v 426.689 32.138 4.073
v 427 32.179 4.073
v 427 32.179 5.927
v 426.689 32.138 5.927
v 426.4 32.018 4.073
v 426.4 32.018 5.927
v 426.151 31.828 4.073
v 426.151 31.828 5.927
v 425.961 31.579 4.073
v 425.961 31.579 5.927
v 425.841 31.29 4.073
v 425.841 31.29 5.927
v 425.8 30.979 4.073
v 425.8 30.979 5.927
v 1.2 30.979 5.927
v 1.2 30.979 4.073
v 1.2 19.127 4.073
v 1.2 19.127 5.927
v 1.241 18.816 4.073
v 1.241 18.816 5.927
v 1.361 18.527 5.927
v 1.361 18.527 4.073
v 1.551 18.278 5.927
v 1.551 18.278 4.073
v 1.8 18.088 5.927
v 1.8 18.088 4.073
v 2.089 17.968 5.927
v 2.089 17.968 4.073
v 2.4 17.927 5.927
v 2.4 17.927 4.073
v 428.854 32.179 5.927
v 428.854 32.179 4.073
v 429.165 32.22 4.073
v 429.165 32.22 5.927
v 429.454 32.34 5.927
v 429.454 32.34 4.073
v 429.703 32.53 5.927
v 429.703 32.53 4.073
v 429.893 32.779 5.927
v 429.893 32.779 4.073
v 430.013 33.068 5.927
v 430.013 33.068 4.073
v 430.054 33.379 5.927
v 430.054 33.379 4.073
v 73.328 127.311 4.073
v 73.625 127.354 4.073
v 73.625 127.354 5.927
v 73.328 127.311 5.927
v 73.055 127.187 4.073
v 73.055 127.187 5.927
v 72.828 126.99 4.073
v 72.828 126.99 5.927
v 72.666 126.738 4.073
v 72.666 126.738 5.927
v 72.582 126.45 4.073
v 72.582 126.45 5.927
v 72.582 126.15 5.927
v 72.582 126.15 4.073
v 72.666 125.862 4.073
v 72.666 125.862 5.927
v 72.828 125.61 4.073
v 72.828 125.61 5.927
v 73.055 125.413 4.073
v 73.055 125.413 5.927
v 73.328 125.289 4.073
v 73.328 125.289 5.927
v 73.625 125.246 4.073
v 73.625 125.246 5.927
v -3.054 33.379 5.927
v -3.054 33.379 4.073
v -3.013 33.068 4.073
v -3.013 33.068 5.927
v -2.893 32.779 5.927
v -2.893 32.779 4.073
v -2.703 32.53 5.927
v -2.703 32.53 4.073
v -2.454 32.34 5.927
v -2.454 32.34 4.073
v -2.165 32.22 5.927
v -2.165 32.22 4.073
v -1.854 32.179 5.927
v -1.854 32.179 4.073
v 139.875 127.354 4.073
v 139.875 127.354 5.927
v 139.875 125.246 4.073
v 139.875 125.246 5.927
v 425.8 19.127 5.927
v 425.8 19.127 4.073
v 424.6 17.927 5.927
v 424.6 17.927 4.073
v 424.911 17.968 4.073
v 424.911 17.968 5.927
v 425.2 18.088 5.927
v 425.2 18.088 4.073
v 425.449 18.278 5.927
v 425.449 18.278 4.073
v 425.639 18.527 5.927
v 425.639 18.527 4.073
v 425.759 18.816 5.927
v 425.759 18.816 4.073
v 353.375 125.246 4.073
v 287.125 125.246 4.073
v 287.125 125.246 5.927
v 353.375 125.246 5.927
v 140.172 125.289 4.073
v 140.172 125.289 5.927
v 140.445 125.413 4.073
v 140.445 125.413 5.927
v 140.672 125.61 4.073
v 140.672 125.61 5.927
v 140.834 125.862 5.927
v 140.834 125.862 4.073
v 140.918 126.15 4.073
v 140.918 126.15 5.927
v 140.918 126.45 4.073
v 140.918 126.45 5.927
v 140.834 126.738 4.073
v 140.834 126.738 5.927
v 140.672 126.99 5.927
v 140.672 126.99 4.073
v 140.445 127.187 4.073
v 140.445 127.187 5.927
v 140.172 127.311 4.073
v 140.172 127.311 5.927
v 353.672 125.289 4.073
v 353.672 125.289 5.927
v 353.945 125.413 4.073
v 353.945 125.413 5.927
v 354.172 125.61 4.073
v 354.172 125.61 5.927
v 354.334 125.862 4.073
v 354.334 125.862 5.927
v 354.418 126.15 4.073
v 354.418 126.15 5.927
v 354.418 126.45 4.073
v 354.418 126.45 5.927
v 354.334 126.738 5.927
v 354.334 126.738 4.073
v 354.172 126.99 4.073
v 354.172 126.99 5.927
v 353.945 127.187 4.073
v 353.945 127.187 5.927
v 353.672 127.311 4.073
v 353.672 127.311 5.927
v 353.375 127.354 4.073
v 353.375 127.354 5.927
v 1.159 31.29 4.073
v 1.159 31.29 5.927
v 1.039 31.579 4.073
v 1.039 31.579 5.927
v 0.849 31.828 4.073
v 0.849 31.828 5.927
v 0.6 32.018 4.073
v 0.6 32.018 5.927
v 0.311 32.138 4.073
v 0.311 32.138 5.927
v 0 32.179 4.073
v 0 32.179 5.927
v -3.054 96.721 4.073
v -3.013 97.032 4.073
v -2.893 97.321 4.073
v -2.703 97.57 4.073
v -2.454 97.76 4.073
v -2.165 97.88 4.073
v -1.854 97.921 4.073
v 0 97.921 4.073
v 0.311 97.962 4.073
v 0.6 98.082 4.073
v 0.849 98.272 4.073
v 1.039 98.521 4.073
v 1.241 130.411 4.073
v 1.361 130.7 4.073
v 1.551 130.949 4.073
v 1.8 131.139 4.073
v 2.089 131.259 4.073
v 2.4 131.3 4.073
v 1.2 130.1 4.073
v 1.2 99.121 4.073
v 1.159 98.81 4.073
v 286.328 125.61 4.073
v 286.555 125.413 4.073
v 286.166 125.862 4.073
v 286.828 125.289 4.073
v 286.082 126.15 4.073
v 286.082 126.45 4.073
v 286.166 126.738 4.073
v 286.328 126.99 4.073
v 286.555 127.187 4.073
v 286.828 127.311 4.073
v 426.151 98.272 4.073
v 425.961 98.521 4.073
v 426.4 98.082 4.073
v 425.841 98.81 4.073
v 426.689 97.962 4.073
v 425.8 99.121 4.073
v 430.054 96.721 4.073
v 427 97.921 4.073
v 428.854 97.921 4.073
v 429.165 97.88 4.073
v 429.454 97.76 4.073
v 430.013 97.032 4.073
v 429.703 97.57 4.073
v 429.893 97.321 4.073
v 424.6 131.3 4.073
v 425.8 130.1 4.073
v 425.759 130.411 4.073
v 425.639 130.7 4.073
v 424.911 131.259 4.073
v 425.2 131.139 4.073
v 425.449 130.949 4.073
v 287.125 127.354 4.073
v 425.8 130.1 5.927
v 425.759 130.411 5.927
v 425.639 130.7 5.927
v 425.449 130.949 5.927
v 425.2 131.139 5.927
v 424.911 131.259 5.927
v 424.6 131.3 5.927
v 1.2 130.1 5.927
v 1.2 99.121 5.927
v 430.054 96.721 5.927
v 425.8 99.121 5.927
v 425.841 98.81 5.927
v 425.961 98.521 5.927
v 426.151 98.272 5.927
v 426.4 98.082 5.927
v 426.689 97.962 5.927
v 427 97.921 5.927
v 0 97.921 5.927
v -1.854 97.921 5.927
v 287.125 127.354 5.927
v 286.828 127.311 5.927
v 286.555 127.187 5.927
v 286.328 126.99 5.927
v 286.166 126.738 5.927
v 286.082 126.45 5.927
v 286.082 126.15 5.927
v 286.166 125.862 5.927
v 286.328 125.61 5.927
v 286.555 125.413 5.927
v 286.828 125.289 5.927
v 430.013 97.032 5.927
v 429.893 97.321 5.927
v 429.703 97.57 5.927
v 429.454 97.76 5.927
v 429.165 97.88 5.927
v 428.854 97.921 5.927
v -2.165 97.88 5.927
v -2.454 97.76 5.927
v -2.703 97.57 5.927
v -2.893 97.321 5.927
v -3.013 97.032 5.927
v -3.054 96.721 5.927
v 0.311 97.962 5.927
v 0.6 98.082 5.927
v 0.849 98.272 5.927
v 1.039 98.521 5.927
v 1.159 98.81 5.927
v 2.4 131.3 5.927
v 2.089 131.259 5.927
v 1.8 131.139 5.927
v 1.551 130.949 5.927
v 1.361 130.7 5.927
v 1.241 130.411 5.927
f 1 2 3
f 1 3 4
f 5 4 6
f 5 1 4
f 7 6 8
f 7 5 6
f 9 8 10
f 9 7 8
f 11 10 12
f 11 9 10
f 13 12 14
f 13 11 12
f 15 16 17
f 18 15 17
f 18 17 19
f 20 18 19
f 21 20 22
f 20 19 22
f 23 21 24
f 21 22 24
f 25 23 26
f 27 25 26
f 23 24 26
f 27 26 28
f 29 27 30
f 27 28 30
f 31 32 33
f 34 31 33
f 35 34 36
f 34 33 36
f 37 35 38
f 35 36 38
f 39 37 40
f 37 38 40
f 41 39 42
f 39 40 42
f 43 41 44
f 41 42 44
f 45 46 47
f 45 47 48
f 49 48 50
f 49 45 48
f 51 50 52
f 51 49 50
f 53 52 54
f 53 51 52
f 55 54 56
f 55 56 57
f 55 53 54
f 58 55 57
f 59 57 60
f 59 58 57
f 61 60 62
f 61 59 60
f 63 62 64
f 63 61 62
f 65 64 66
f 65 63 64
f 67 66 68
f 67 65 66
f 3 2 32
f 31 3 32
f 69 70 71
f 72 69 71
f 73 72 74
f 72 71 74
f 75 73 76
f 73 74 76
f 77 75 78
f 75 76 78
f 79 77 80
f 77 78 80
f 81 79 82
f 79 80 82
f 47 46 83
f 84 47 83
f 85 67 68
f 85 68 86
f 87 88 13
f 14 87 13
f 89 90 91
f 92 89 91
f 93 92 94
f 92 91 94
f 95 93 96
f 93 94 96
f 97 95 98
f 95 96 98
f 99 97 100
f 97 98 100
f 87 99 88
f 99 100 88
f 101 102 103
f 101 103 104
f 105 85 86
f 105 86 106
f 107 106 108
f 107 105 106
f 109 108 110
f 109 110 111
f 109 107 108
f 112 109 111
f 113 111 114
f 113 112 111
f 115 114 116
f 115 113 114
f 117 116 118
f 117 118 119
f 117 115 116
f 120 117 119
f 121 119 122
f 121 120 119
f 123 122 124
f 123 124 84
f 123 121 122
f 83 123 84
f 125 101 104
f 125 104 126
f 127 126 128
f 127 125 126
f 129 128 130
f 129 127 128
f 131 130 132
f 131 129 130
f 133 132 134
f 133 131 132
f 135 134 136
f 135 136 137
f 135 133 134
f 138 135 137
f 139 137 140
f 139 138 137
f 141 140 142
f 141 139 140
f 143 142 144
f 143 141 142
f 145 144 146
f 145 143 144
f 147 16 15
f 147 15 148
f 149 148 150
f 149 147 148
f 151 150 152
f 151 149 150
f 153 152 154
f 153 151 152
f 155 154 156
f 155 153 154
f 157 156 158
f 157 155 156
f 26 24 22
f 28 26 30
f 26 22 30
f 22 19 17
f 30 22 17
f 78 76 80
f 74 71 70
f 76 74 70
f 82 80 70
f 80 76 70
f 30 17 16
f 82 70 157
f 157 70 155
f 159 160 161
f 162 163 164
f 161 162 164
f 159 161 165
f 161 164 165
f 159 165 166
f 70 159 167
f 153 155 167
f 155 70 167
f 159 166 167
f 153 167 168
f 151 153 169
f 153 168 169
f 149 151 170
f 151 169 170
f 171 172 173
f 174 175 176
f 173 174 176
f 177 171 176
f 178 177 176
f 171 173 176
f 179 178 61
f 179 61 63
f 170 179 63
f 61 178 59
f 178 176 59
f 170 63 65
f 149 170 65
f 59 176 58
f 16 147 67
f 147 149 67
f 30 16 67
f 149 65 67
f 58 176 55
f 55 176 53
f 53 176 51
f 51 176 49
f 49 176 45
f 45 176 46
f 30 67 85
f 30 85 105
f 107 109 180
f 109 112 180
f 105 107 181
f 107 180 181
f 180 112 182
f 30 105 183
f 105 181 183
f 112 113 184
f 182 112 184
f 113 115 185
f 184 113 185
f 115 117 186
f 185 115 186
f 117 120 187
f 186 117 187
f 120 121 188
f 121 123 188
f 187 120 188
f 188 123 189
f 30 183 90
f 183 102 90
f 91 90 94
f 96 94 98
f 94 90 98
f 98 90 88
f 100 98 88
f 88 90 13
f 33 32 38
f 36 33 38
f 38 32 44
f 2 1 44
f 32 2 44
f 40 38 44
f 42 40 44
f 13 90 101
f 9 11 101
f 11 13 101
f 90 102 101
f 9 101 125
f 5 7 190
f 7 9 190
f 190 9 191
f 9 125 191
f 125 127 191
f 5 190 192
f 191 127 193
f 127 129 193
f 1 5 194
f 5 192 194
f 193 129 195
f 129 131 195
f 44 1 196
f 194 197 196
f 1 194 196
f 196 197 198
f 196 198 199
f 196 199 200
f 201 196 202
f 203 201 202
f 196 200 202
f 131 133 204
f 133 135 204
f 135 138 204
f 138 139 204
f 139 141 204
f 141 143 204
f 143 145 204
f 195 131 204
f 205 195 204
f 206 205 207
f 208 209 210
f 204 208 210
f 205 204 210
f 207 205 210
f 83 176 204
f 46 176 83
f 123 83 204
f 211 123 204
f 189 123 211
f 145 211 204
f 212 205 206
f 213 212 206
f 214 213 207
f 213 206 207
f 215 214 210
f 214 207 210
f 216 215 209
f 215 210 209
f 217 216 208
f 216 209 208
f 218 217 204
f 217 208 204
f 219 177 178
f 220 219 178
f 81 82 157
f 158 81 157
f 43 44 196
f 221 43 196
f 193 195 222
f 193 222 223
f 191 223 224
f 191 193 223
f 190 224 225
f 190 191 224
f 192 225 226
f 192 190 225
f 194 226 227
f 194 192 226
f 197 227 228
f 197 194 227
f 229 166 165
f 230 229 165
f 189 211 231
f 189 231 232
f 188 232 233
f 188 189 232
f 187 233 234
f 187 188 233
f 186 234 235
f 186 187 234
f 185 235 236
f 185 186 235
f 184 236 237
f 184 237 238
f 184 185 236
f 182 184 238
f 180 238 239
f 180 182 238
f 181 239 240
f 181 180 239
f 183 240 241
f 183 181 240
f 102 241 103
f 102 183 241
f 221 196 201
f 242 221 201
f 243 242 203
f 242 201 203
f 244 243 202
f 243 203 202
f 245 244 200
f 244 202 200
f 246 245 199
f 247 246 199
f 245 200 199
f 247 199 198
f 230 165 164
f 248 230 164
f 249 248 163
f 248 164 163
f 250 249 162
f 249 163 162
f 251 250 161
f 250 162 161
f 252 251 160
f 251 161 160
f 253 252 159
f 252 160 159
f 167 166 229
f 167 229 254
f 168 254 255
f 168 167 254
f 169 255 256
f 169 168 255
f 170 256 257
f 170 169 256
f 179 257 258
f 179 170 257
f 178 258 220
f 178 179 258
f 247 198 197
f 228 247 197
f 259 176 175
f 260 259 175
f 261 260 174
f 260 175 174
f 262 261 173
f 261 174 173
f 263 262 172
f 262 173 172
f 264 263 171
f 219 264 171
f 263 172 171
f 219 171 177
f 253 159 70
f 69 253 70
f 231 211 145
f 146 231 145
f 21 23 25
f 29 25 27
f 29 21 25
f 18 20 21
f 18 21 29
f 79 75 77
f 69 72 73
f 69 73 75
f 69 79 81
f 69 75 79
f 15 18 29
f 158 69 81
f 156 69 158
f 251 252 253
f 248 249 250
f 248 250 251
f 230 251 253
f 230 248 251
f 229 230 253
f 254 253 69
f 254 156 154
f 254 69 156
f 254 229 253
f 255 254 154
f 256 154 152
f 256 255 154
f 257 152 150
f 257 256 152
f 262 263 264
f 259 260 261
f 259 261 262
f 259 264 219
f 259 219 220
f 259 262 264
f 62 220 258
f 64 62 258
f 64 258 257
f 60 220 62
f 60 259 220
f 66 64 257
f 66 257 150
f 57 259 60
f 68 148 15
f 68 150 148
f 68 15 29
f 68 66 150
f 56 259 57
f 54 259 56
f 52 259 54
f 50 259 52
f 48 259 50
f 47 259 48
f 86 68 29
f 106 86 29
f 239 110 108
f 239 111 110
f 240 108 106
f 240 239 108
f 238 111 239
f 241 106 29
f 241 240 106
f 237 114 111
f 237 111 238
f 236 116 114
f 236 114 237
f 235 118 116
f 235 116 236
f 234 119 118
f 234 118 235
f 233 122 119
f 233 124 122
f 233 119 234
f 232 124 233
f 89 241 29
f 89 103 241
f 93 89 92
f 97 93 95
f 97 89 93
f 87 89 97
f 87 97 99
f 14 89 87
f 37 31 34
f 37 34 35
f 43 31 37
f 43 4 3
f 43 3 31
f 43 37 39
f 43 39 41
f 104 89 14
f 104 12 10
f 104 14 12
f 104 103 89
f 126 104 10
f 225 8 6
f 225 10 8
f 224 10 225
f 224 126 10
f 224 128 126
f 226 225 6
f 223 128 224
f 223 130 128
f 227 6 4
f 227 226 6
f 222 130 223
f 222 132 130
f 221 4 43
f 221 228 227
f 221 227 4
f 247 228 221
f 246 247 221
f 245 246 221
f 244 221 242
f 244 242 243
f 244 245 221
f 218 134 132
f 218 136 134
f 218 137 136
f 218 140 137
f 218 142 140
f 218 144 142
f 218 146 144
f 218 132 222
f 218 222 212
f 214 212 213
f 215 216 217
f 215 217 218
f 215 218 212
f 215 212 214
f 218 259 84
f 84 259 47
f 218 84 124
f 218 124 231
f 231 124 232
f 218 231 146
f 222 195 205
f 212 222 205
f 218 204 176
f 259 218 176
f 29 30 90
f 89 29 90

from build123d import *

# Parameters (mm, degrees)
PAD_DEPTH = 1.8542


with BuildPart() as part:
    # Sketch (on Face17 of Binder) → Pad (new body)
    with BuildSketch(Plane.XY.offset(4.0729)):
        with BuildLine():
            Line((-3.0542, 96.721), (-3.0542, 33.379))
            ThreePointArc((-3.0542, 33.379), (-2.702728, 32.530472), (-1.8542, 32.179))
            Line((-1.8542, 32.179), (0, 32.179))
            ThreePointArc((1.2, 30.979), (0.848528, 31.827528), (0, 32.179))
            Line((1.2, 30.979), (1.2, 19.127))
            ThreePointArc((1.2, 19.127), (1.551472, 18.278472), (2.4, 17.927))
            Line((2.4, 17.927), (424.6, 17.927))
            ThreePointArc((424.6, 17.927), (425.448528, 18.278472), (425.8, 19.127))
            Line((425.8, 19.127), (425.8, 30.979))
            ThreePointArc((427, 32.179), (426.151472, 31.827528), (425.8, 30.979))
            Line((427, 32.179), (428.8542, 32.179))
            ThreePointArc((428.8542, 32.179), (429.702728, 32.530472), (430.0542, 33.379))
            Line((430.0542, 33.379), (430.0542, 96.721))
            ThreePointArc((430.0542, 96.721), (429.702728, 97.569528), (428.8542, 97.921))
            Line((428.8542, 97.921), (427, 97.921))
            ThreePointArc((425.8, 99.121), (426.151472, 98.272472), (427, 97.921))
            Line((425.8, 99.121), (425.8, 130.1))
            ThreePointArc((425.8, 130.1), (425.448528, 130.948528), (424.6, 131.3))
            Line((424.6, 131.3), (2.4, 131.3))
            ThreePointArc((2.4, 131.3), (1.551472, 130.948528), (1.2, 130.1))
            Line((1.2, 130.1), (1.2, 99.121))
            ThreePointArc((0, 97.921), (0.848528, 98.272472), (1.2, 99.121))
            Line((0, 97.921), (-1.8542, 97.921))
            ThreePointArc((-1.8542, 97.921), (-2.702728, 97.569528), (-3.0542, 96.721))
        make_face()
        with BuildLine():
            ThreePointArc((73.625, 127.3541), (72.5709, 126.3), (73.625, 125.2459))
            Line((73.625, 125.2459), (139.875, 125.2459))
            ThreePointArc((139.875, 125.2459), (140.9291, 126.3), (139.875, 127.3541))
            Line((73.625, 127.3541), (139.875, 127.3541))
        make_face(mode=Mode.SUBTRACT)
        with BuildLine():
            ThreePointArc((287.125, 127.3541), (286.0709, 126.3), (287.125, 125.2459))
            Line((287.125, 125.2459), (353.375, 125.2459))
            ThreePointArc((353.375, 125.2459), (354.4291, 126.3), (353.375, 127.3541))
            Line((287.125, 127.3541), (353.375, 127.3541))
        make_face(mode=Mode.SUBTRACT)
    extrude(amount=PAD_DEPTH)


solid = part.part
